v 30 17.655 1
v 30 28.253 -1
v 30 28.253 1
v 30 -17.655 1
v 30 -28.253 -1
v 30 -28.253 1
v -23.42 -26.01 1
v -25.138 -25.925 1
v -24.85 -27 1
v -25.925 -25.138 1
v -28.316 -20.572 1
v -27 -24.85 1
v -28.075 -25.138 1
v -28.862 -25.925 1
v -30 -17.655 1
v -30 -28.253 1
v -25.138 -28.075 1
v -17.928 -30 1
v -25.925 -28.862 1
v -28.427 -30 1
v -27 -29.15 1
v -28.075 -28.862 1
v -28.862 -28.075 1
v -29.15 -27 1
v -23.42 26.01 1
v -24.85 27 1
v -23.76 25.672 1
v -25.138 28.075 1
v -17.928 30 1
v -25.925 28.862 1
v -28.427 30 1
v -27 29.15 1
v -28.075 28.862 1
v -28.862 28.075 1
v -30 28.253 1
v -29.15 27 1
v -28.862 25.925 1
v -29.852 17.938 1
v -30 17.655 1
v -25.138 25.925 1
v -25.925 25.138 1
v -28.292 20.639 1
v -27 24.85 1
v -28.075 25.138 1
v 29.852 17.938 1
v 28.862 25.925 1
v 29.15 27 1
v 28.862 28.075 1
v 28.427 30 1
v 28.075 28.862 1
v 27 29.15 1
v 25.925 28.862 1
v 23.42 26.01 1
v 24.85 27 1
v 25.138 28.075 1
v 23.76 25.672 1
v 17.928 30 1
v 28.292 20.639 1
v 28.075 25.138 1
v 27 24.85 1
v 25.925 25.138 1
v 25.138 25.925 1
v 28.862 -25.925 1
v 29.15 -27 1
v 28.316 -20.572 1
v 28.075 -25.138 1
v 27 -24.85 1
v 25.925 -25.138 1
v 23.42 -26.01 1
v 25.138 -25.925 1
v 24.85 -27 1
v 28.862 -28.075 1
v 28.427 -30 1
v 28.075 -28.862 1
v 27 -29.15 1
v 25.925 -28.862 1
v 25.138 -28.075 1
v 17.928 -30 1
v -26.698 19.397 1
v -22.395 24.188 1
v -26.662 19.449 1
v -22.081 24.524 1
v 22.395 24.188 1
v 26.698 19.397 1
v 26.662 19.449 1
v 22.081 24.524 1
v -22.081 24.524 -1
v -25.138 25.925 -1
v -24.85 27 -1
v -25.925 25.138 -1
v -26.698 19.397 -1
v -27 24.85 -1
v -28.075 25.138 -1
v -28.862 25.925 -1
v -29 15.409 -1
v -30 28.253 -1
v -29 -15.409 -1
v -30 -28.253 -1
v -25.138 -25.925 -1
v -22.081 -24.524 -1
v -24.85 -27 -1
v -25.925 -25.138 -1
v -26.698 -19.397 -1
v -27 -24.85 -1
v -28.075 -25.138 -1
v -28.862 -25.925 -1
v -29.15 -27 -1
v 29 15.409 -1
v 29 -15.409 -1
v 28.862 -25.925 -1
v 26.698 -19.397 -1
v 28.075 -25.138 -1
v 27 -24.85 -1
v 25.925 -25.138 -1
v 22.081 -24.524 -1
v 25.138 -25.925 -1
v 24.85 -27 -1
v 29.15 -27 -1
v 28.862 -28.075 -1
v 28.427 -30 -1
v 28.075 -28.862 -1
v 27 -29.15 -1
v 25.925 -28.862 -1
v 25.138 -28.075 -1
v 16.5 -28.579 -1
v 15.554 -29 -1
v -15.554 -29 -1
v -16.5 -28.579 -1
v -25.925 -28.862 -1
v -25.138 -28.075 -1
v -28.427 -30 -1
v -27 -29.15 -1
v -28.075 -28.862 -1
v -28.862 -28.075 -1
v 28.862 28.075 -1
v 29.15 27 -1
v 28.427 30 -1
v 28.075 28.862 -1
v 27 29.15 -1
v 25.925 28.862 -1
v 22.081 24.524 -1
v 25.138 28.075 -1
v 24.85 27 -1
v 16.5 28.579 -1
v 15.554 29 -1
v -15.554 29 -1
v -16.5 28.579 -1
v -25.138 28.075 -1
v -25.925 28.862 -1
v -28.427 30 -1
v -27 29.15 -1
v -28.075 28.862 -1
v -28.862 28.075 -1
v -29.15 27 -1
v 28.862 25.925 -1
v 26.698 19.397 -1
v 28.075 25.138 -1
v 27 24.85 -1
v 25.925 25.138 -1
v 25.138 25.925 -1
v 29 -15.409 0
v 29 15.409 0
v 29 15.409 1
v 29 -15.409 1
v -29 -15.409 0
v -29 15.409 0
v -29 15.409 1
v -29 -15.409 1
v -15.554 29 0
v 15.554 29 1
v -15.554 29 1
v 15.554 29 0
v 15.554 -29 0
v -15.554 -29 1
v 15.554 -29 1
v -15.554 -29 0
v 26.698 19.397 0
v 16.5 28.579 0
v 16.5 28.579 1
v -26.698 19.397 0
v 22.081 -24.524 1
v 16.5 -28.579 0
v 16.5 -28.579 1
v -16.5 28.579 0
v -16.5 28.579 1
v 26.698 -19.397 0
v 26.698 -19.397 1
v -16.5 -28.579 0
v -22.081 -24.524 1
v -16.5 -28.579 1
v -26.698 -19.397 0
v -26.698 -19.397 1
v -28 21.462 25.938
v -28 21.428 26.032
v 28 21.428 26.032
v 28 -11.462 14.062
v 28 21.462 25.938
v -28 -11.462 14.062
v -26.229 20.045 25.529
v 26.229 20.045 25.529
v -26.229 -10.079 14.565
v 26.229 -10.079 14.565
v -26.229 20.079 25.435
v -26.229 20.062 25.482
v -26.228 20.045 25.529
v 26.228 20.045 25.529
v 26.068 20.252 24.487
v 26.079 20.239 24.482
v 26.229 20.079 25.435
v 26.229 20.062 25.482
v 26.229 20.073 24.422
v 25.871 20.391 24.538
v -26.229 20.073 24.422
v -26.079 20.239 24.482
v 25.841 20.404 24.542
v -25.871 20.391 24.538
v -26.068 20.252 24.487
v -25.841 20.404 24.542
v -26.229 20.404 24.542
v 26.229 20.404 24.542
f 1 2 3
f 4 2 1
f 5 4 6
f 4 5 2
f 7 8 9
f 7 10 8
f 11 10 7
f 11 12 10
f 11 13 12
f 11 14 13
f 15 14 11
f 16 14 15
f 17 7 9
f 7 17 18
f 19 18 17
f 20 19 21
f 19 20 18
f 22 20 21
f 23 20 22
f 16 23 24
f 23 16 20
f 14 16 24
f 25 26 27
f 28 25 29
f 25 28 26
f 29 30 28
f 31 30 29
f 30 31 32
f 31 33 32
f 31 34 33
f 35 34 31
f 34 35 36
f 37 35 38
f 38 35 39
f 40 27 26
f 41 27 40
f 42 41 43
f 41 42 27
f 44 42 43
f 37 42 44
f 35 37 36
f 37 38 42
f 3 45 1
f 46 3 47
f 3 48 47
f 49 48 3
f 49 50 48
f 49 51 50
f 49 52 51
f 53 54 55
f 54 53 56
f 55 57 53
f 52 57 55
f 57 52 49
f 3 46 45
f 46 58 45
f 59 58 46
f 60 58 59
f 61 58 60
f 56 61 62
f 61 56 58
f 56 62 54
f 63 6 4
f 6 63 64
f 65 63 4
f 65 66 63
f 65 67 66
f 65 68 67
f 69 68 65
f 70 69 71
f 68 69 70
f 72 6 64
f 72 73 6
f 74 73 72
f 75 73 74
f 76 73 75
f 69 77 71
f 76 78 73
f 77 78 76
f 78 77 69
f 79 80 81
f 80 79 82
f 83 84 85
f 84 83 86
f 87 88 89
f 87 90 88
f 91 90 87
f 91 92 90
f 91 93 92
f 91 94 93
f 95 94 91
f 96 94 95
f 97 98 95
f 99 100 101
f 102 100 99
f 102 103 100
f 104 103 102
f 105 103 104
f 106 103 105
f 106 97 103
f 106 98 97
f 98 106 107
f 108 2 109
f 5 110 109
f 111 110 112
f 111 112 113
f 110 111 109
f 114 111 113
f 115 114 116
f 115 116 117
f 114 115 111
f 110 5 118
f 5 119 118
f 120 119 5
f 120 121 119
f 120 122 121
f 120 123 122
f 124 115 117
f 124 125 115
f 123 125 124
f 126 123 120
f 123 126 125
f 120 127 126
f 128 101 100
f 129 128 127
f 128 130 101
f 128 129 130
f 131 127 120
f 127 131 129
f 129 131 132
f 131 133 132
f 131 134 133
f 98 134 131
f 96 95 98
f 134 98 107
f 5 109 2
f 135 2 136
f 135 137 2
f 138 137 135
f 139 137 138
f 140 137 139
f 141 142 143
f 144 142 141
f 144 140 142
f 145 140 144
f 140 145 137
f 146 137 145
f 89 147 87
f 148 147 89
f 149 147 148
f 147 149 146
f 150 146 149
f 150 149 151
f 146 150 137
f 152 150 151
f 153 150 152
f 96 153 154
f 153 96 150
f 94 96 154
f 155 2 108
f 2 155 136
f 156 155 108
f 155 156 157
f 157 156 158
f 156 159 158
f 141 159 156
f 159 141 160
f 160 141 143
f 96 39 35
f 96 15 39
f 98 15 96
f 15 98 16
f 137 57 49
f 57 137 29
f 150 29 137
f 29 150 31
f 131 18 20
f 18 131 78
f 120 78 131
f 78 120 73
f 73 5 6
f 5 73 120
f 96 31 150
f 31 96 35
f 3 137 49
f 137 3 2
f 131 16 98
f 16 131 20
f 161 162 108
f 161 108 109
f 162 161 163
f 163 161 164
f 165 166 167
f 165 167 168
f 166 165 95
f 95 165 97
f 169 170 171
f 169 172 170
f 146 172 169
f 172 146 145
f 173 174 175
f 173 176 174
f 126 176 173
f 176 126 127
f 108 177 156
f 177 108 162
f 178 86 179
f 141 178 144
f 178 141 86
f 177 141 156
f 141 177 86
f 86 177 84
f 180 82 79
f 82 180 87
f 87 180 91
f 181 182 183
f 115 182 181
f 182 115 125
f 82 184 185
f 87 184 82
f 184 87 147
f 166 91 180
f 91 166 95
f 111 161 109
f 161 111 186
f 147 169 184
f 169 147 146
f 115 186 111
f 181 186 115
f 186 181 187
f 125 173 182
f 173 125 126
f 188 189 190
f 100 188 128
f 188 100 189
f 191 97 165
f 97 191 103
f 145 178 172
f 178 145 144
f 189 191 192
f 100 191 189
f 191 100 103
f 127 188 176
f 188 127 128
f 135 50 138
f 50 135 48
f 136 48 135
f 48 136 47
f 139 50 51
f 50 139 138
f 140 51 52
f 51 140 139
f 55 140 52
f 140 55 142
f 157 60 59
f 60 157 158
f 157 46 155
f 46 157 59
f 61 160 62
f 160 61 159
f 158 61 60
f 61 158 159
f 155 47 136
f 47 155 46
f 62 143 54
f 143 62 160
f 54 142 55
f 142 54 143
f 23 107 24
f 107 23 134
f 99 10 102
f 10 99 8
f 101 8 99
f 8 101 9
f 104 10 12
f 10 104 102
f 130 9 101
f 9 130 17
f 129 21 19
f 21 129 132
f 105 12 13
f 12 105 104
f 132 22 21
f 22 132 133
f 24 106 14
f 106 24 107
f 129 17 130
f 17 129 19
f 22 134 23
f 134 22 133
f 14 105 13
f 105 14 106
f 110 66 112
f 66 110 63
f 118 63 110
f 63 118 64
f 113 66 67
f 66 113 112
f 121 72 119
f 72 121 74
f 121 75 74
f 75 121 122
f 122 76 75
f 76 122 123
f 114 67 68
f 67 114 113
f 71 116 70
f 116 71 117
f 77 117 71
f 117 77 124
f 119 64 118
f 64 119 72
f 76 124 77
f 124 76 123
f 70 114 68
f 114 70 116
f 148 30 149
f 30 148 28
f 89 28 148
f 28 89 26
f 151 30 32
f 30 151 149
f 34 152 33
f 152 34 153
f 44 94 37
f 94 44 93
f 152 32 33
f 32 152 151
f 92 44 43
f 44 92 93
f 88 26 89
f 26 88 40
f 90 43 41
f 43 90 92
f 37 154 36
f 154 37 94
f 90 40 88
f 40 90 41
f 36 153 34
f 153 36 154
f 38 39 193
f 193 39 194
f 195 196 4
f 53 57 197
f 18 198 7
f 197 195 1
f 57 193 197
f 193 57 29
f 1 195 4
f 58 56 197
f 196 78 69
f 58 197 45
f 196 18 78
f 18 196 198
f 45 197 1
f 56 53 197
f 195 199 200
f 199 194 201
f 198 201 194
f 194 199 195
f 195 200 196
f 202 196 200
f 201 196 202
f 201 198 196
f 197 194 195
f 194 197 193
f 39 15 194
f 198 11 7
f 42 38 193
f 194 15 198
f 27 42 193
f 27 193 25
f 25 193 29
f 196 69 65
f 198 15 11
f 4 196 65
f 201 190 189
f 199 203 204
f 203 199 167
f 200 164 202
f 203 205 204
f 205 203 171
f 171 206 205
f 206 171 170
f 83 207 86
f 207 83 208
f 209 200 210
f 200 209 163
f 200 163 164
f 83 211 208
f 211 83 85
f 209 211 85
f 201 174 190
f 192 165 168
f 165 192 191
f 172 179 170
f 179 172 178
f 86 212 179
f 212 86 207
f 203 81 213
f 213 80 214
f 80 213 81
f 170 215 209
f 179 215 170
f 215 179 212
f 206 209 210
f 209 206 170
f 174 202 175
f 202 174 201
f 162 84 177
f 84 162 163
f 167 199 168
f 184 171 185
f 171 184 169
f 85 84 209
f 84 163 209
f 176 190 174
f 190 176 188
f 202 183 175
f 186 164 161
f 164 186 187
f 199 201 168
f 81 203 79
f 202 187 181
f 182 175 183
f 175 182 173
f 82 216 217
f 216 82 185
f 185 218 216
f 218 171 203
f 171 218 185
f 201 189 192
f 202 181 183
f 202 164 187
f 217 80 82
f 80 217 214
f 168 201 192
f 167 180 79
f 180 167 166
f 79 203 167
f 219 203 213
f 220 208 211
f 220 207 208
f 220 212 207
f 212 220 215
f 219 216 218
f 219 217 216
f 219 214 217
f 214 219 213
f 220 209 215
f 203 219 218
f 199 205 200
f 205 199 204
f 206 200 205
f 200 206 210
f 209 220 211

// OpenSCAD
/* [Base] */

// Base height (mm)
base_height=2;

// Fan body size (mm)
fan_size=60;

// Diameter of the helice hole
fan_hole_diameter=70;



/* [Fixation] */

// Screw diameter (mm)
base_screw_diameter=4.3;

// Margin with border (mm)
base_screw_margin=3;



/* [Duct] */

// Duct shape
duct_shape = "squared"; // [rounded, squared, heart]

// Duct height
duct_height=20;

// Scale over X (% of fan_hole_diameter)
duct_width=.80;
// Scale over Y (% of fan_hole_diameter)
duct_length=.50;

// Hole orientation over X
duct_rotation_x=20; // [-30:30]
// Hole orientation over Y
duct_rotation_y=0; // [-30:30]
// Hole orientation over Z
duct_rotation_z=0; // [-30:30]

// Distance from center X
duct_delta_x=0;
// Distance from center X
duct_delta_y=5;

// Border thickness
duct_border_width=2;



/* [Hidden] */

// Main Object

//difference() {
union() {
  base();
  duct();
}
/*translate([0, -100, -50])
cube([100, 100, 100]);
}*/

//translate([0, 0, 50]) _duct_top_form_heart();



// build the duct base
module base() {
  difference() {
    _base_form();
    _fan_hole_form(base_height+1, duct_border_width);
    _screw();
  }
}



module _screw() {
  $fn=12;
  // holes Position var
  s_hole=fan_size/2-base_screw_margin;

  translate([s_hole, s_hole, 0])
    cylinder(r=base_screw_diameter/2, h=base_height+2, center=true);
  translate([-s_hole, -s_hole, 0])
    cylinder(r=base_screw_diameter/2, h=base_height+2, center=true);
  translate([s_hole, -s_hole, 0])
    cylinder(r=base_screw_diameter/2, h=base_height+2, center=true);
  translate([-s_hole, s_hole, 0])
    cylinder(r=base_screw_diameter/2, h=base_height+2, center=true);
}



// build the duct
module duct() {
  difference() {
    // outter
    _duct();
    // inner
    _duct(duct_border_width);

    //top hole
      _duct_top_form(2,duct_border_width);

    // bottom hole
    translate([0, 0, -1])
      _fan_hole_form(2, duct_border_width);
  }
}



module _duct(margin=0) {
    hull() {
      // top
      _duct_top_form(0.1, margin);
      // bottom
      _fan_hole_form(base_height, margin);
    }
}



module _duct_top_form(height=0.1, margin=0) {
  translate([duct_delta_x, duct_delta_y, duct_height])
    rotate([duct_rotation_x, duct_rotation_y, duct_rotation_z])
      scale([
      duct_width-(margin/fan_hole_diameter),
      duct_length-(margin/fan_hole_diameter),
       1])

    if (duct_shape == "rounded") {
      _duct_top_form_rounded(height, margin);
    } else if 	(duct_shape == "squared") {
      _duct_top_form_squared(height, margin);
    } else if 	(duct_shape == "heart") {
      _duct_top_form_heart(height, margin);
    }
}



module _duct_top_form_rounded(height=0.1, margin=0) {
      cylinder(r=(fan_hole_diameter-margin)/2, h=height, center=true);
}



module _duct_top_form_squared(height=0.1, margin=0) {
      cube([(fan_hole_diameter-margin), (fan_hole_diameter-margin), height], center=true);
}



module _duct_top_form_heart(height=0.1, margin=0) {
  rotate([0, 0, -45])
    union () {
      cube([(fan_hole_diameter-margin)/2, (fan_hole_diameter-margin)/2, height], center=true);
      translate([-(fan_hole_diameter-margin)/4, 0, 0])
        cylinder(r=(fan_hole_diameter-margin)/4, h=height, center=true);
      translate([0, (fan_hole_diameter-margin)/4, 0])
        cylinder(r=(fan_hole_diameter-margin)/4, h=height, center=true);
    }
}



// get the hole form
module _fan_hole_form(height=base_height, margin=0) {
  intersection() {
    _base_form(height, margin);
    cylinder(r=(fan_hole_diameter)/2-margin, h=height, center=true);
  }
  
}



// get the base form
module _base_form(height=base_height, margin=0) {
  intersection() {
    cube([fan_size-margin, fan_size-margin, height], center=true);
    cylinder(r=sqrt(2*fan_size/2*fan_size/2)-duct_border_width/2, h=height, center=true);
  }
}
